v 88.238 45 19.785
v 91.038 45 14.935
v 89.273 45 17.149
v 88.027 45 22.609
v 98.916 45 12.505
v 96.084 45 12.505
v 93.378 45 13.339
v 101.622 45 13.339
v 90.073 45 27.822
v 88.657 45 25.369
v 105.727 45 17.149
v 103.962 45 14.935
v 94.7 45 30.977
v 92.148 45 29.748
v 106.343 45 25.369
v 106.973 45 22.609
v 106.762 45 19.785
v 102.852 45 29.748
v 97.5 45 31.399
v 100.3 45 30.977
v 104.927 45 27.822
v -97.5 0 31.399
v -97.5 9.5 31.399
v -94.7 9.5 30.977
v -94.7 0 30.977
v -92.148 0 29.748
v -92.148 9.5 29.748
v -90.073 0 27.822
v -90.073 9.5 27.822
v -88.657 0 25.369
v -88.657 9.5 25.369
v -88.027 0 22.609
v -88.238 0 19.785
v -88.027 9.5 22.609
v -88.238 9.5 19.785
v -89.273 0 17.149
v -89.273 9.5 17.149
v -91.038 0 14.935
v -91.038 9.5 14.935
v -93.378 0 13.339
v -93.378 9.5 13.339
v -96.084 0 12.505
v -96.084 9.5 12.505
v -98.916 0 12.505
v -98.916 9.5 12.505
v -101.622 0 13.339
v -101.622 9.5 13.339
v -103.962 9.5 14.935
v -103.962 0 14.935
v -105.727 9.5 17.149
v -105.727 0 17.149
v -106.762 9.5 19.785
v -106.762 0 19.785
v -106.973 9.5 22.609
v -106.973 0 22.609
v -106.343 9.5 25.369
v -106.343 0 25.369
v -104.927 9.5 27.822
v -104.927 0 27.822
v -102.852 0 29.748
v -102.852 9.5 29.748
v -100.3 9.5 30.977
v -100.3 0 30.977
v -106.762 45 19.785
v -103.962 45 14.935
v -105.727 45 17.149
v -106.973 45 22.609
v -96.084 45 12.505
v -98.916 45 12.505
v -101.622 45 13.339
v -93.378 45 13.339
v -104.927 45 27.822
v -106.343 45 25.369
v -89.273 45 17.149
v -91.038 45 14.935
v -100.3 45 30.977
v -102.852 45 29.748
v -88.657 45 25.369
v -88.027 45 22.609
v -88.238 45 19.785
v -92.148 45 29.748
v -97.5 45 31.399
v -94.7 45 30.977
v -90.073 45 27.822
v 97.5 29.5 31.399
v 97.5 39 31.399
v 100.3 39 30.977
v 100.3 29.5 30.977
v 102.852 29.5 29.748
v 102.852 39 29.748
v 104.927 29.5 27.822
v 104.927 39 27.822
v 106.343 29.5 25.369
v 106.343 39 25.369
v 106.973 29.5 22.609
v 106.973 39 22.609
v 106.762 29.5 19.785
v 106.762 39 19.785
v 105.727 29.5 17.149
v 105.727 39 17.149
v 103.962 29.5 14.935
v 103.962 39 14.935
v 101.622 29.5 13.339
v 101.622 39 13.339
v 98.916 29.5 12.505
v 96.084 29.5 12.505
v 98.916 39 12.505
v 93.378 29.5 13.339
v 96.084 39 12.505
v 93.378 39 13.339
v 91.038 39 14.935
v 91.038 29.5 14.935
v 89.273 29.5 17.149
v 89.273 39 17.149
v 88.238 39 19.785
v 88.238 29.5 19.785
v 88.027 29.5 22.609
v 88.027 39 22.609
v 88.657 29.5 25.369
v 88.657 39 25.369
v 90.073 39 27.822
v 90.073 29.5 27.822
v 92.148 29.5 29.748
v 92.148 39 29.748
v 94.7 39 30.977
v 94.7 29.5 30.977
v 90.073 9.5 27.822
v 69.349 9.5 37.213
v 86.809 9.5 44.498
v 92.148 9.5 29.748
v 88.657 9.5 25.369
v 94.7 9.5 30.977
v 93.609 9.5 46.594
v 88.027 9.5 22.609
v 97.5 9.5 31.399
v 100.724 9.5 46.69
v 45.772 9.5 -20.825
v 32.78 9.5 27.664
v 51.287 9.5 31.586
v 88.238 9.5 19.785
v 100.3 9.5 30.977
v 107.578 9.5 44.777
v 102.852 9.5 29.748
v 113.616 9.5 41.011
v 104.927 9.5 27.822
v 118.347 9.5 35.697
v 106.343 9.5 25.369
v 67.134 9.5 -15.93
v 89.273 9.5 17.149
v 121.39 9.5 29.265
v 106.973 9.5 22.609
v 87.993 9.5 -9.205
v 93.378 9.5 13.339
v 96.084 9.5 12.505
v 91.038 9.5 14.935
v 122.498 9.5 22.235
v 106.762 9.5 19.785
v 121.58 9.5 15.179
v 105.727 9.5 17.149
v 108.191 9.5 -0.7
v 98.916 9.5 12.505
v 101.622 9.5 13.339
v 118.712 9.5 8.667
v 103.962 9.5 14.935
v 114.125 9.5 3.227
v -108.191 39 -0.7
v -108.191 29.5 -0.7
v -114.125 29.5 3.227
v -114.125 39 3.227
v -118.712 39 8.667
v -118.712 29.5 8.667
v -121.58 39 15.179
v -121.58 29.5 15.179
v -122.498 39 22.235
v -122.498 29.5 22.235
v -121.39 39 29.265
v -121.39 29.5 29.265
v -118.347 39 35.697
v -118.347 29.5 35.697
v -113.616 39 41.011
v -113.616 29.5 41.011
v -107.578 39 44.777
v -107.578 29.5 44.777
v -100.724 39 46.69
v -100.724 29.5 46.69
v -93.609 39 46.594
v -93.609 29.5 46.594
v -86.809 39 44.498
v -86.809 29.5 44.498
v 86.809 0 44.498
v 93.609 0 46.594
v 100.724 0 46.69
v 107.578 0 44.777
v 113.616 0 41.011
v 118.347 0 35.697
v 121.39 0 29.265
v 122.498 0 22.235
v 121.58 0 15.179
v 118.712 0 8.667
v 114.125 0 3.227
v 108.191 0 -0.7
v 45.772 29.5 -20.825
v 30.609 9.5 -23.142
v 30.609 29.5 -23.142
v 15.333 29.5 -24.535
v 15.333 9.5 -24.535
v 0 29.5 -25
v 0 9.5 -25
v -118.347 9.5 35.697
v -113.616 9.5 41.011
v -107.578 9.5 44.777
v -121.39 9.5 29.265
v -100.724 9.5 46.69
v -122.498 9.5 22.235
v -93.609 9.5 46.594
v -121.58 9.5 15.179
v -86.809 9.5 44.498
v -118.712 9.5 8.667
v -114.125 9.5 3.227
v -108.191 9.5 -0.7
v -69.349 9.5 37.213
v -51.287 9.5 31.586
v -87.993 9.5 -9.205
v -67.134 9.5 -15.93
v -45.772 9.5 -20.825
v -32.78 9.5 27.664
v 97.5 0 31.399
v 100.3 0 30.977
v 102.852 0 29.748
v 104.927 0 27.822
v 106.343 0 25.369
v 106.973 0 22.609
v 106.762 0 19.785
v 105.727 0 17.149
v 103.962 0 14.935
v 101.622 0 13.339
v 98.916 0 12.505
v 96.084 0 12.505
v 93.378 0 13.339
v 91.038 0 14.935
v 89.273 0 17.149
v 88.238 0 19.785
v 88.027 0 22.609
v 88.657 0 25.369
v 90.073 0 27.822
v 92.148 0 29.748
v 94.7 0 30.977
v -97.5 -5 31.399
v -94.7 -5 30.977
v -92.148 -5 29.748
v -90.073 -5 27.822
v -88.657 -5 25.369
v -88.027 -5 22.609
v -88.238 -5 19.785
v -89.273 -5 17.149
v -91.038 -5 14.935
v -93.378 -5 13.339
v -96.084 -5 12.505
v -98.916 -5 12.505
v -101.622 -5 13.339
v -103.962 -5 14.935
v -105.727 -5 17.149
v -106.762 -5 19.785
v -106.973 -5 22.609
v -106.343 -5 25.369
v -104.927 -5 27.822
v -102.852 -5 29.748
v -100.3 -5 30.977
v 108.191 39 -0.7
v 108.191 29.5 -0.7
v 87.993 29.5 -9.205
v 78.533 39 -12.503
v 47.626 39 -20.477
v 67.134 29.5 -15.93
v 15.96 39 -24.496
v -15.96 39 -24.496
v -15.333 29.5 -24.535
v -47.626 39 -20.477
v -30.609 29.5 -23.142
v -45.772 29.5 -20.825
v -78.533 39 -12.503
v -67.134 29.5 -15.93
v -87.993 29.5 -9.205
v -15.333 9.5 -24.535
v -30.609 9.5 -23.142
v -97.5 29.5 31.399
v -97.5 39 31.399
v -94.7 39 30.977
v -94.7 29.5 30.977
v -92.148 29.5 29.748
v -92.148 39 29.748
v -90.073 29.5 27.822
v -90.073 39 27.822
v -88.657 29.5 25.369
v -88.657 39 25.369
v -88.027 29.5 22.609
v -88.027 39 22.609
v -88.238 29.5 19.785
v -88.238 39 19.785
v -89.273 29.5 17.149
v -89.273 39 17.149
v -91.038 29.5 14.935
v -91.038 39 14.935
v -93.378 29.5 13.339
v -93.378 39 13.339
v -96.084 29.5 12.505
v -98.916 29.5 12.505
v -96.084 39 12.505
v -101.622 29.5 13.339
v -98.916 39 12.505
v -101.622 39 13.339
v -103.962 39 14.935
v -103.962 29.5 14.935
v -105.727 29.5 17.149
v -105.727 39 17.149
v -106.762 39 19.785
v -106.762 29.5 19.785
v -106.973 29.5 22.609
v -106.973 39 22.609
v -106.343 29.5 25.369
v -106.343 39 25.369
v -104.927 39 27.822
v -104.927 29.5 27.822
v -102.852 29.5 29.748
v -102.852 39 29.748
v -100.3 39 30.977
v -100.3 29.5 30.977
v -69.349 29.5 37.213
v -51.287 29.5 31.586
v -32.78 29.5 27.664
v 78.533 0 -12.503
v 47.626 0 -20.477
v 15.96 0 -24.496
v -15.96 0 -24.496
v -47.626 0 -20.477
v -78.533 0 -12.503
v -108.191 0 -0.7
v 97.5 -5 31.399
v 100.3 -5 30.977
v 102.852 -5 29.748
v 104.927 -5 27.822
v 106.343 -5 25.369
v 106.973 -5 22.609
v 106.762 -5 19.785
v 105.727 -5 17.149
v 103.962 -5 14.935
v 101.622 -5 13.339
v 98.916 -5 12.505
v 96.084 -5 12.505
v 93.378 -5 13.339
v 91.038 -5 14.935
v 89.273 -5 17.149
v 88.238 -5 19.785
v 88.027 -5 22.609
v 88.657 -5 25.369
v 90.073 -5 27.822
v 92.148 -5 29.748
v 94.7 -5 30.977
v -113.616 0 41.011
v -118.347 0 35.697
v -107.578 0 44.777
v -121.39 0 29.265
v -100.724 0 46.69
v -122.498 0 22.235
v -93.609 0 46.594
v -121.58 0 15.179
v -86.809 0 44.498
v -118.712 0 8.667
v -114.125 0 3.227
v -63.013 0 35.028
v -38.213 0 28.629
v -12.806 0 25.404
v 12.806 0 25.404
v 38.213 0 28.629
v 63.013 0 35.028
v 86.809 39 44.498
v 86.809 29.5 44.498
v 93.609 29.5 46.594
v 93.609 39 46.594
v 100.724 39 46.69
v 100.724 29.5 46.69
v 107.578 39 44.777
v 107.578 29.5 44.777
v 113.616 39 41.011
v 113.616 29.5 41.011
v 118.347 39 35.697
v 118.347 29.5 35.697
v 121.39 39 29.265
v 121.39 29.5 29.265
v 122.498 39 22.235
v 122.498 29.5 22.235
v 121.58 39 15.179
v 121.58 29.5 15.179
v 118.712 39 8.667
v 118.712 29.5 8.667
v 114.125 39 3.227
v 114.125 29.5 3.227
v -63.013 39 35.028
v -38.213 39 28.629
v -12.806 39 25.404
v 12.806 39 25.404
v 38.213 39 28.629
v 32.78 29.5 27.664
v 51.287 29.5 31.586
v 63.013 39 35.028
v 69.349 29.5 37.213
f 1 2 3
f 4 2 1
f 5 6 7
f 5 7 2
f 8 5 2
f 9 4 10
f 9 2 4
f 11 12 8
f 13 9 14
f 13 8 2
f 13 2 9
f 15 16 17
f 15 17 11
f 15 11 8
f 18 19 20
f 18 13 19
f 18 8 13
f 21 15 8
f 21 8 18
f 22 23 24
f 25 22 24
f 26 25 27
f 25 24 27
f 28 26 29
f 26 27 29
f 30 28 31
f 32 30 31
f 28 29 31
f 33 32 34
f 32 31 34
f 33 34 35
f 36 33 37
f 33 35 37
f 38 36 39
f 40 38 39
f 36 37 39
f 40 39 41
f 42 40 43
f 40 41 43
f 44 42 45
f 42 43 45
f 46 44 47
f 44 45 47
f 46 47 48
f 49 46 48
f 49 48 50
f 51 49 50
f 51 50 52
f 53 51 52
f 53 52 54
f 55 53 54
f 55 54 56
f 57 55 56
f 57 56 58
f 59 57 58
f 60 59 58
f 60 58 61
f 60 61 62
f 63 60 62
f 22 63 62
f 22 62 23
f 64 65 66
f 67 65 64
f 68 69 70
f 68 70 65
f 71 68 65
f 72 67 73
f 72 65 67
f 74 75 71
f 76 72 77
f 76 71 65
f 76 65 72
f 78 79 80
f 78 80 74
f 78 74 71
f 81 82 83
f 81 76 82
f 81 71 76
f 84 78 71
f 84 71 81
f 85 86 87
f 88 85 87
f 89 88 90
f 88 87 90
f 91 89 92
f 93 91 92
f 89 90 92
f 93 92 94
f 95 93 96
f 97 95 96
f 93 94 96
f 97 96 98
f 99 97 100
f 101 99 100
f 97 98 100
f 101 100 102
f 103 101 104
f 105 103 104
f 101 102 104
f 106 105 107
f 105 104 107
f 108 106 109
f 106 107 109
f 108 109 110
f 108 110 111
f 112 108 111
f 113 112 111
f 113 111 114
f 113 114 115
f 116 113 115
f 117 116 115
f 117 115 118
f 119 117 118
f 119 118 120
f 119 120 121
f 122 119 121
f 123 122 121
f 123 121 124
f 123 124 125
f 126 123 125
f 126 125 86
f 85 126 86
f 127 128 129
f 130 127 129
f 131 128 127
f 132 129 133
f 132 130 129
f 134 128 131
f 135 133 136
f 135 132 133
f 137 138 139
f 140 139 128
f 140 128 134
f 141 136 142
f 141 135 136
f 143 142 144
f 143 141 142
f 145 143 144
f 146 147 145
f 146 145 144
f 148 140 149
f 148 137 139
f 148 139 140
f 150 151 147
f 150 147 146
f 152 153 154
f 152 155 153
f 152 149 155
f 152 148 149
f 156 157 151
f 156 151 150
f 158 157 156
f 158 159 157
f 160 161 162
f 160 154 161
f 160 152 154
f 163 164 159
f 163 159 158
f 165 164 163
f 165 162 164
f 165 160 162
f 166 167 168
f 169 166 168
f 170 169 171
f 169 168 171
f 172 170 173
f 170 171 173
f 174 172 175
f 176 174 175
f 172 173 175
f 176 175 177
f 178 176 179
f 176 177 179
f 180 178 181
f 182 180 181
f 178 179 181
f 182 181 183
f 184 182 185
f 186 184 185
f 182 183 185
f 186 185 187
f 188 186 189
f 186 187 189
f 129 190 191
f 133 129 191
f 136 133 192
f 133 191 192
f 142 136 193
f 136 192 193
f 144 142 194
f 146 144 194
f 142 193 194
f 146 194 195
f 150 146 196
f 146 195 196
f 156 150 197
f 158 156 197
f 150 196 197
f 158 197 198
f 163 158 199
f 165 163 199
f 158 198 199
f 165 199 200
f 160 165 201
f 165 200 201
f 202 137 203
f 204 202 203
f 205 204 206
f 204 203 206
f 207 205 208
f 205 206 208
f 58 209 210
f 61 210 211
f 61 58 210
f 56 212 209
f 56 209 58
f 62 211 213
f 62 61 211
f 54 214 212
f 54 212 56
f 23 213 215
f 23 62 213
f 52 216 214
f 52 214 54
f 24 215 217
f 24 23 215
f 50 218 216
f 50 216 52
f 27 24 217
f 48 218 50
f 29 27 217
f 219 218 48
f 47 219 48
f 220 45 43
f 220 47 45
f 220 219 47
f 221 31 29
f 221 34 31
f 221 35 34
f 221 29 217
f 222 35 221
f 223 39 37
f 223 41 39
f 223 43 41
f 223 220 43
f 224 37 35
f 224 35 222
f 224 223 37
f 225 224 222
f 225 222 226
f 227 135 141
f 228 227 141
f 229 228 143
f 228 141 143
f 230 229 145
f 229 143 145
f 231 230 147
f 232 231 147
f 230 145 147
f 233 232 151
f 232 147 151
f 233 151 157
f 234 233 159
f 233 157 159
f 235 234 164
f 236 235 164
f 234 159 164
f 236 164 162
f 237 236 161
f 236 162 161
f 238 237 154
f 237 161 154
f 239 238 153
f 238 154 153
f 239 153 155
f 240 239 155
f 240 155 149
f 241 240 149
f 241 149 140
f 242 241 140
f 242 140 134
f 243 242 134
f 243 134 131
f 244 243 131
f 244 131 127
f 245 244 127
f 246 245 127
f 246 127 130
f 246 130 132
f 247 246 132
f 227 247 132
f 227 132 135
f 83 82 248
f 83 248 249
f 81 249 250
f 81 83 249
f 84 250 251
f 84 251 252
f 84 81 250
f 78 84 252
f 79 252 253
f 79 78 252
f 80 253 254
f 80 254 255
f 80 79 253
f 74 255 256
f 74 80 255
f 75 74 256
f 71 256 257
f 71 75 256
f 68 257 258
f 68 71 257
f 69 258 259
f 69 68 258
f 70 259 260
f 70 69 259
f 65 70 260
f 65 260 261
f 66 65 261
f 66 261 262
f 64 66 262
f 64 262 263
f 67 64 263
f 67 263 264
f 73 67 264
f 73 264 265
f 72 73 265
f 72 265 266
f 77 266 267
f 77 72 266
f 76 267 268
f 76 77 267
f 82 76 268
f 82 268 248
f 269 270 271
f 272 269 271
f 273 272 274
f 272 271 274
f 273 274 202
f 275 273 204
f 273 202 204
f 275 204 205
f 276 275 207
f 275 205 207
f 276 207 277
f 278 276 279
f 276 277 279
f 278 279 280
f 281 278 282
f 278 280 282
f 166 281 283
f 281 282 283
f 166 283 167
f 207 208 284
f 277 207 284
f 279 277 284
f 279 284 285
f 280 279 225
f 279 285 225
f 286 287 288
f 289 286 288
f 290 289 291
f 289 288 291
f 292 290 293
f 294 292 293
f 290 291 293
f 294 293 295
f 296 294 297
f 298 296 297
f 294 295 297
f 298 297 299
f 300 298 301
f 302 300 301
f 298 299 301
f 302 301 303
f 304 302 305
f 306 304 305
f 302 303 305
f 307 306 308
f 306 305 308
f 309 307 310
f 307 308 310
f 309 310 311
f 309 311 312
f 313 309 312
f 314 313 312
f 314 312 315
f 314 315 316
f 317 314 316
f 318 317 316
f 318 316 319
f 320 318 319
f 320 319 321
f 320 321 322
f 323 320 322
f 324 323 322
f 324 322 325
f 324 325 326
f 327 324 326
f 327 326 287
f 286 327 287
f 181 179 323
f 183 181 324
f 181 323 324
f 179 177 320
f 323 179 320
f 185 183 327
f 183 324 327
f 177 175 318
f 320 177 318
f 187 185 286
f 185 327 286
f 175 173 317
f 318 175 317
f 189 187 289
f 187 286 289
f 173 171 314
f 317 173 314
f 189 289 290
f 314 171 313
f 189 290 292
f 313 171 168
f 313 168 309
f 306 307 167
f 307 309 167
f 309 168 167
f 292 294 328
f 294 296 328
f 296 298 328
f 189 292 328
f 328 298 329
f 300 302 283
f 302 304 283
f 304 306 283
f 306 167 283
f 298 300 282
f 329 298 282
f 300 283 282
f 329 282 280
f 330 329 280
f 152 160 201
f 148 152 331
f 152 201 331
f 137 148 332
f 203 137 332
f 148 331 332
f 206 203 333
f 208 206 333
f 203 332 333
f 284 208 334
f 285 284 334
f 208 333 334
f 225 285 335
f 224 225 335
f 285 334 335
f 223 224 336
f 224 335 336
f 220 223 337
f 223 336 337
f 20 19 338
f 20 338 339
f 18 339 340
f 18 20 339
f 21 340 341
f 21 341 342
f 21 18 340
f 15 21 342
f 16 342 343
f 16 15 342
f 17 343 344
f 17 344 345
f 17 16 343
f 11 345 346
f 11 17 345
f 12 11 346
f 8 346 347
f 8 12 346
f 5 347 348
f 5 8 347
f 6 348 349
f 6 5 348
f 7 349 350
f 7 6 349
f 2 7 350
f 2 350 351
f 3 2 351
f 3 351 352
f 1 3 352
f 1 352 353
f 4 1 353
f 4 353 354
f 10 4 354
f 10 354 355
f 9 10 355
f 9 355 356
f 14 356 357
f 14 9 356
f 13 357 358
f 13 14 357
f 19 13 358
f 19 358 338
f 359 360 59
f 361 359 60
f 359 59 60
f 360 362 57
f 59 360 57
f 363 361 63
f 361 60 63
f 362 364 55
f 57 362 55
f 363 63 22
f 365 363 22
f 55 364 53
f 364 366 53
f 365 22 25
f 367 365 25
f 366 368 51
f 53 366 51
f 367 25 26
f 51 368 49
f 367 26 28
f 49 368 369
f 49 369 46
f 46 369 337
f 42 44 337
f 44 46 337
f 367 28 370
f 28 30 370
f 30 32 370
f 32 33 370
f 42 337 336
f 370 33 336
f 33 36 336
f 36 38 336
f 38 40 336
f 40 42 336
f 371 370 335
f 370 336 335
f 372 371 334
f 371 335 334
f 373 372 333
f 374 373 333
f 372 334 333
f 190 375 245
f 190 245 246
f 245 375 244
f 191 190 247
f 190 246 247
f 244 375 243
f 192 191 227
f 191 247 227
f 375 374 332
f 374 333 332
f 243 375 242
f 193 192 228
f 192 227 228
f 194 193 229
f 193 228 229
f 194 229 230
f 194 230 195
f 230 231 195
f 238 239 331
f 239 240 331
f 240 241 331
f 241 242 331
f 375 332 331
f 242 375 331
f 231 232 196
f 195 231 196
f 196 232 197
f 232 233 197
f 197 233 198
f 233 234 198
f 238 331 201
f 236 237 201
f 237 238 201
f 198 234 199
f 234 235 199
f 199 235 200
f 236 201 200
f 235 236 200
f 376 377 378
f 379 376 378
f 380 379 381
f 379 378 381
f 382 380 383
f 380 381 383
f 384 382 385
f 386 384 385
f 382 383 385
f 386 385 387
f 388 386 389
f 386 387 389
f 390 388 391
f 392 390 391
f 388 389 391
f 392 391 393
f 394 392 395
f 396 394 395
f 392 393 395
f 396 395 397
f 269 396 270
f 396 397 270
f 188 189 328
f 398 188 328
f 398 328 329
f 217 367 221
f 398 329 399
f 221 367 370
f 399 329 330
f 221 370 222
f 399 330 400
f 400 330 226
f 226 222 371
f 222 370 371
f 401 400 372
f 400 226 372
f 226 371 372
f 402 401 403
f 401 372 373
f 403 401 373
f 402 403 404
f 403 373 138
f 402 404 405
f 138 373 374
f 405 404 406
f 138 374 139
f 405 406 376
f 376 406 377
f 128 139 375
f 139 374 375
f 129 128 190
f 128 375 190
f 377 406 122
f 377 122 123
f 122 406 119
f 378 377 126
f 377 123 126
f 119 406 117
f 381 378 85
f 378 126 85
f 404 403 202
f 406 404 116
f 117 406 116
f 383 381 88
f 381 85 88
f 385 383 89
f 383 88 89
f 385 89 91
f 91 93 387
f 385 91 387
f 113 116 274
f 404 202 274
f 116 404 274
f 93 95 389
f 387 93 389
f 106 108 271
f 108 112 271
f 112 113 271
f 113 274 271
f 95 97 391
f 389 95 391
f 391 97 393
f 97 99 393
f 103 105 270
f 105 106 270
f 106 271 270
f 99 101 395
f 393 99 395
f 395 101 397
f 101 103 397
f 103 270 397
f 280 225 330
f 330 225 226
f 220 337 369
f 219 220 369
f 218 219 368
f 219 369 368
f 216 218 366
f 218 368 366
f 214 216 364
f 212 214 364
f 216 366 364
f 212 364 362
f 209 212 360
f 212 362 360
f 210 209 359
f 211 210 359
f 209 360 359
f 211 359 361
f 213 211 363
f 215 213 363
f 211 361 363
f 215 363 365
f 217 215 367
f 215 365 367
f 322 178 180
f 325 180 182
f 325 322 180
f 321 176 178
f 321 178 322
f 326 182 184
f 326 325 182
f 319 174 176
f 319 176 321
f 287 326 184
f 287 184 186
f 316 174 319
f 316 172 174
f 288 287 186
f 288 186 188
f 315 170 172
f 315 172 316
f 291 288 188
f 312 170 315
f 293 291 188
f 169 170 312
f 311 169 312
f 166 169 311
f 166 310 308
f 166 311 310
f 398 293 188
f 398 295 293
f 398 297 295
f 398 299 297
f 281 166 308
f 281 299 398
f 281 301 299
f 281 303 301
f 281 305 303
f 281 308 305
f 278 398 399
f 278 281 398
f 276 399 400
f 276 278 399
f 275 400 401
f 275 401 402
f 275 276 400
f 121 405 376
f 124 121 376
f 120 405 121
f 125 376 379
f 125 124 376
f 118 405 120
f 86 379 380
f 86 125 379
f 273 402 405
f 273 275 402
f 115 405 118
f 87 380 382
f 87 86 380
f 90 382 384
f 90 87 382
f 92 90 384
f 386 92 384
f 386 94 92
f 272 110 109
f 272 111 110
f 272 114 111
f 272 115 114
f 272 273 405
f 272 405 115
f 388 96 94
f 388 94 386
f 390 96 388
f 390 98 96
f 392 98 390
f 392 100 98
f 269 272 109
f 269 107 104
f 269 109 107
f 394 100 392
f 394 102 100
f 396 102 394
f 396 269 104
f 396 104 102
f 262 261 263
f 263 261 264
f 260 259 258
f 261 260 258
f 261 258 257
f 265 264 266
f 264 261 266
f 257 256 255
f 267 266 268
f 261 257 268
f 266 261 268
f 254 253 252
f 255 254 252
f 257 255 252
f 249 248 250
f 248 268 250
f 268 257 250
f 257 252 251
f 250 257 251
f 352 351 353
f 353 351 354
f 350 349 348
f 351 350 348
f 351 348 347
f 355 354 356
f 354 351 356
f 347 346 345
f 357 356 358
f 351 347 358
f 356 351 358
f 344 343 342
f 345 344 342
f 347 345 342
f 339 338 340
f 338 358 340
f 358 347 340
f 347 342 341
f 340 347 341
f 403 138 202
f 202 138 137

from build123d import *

# Parameters (mm, degrees)
BOSS_EXTRUDE1_DEPTH   = 9.5
BOSS_EXTRUDE2_DEPTH   = 20
BOSS_EXTRUDE3_DEPTH   = 9.5
SKETCH4_R             = 9.5
CUT_EXTRUDE1_DEPTH    = 137.845668985
BOSS_EXTRUDE4_START   = 6
SKETCH4_2_R           = 9.5
BOSS_EXTRUDE4_DEPTH   = 50
BOSS_EXTRUDE4_2_DEPTH = 50


with BuildPart() as part:
    # Sketch1 → Boss-Extrude1 (new body)
    with BuildSketch(Plane(origin=(0, 0, 0), x_dir=(1, 0, 0), z_dir=(0, 1, 0))):
        with BuildLine():
            ThreePointArc((108.190789474, 0.700137895), (0, 25), (-108.190789474, 0.700137895))
            ThreePointArc((-108.190789474, 0.700137895), (-120.098827855, -32.589479434), (-86.809210526, -44.497517816))
            ThreePointArc((-86.809210526, -44.497517816), (0, -25), (86.809210526, -44.497517816))
            ThreePointArc((86.809210526, -44.497517816), (120.098827855, -32.589479434), (108.190789474, 0.700137895))
        make_face()
    extrude(amount=BOSS_EXTRUDE1_DEPTH)

    # Sketch2 → Boss-Extrude2 (add)
    with BuildSketch(Plane(origin=(0, 9.5, 0), x_dir=(1, 0, 0), z_dir=(0, 1, 0))):
        with BuildLine():
            ThreePointArc((45.772423296, 20.825009325), (0, 25), (-45.772423296, 20.825009325))
            Line((-45.772423296, 20.825009325), (-32.779812988, -27.664072467))
            ThreePointArc((-32.779812988, -27.664072467), (0, -25), (32.779812988, -27.664072467))
            Line((32.779812988, -27.664072467), (45.772423296, 20.825009325))
        make_face()
    extrude(amount=BOSS_EXTRUDE2_DEPTH)

    # Sketch3 → Boss-Extrude3 (add)
    with BuildSketch(Plane(origin=(0, 29.5, 0), x_dir=(1, 0, 0), z_dir=(0, 1, 0))):
        with BuildLine():
            ThreePointArc((108.190789474, 0.700137895), (0, 25), (-108.190789474, 0.700137895))
            ThreePointArc((-108.190789474, 0.700137895), (-120.098827855, -32.589479434), (-86.809210526, -44.497517816))
            ThreePointArc((-86.809210526, -44.497517816), (0, -25), (86.809210526, -44.497517816))
            ThreePointArc((86.809210526, -44.497517816), (120.098827855, -32.589479434), (108.190789474, 0.700137895))
        make_face()
    extrude(amount=BOSS_EXTRUDE3_DEPTH)

    # Sketch4 → Cut-Extrude1 (cut, through all)
    with BuildSketch(Plane(origin=(0, 39, 0), x_dir=(1, 0, 0), z_dir=(0, 1, 0))):
        with Locations((-97.5, -21.89868996)):
            Circle(SKETCH4_R)
        with Locations((97.5, -21.89868996)):
            Circle(SKETCH4_R)
    extrude(amount=-CUT_EXTRUDE1_DEPTH, mode=Mode.SUBTRACT)


with BuildPart() as body_2:
    # Sketch4<2> → Boss-Extrude4 (new body)
    with BuildSketch(Plane(origin=(0, 39, 0), x_dir=(1, 0, 0), z_dir=(0, 1, 0)).offset(BOSS_EXTRUDE4_START)):
        with Locations((-97.5, -21.89868996)):
            Circle(SKETCH4_2_R)
    extrude(amount=-BOSS_EXTRUDE4_DEPTH)


with BuildPart() as body_3:
    # Sketch4<2> → Boss-Extrude4 2 (new body)
    with BuildSketch(Plane(origin=(0, 39, 0), x_dir=(1, 0, 0), z_dir=(0, 1, 0)).offset(BOSS_EXTRUDE4_START)):
        with Locations((97.5, -21.89868996)):
            Circle(SKETCH4_2_R)
    extrude(amount=-BOSS_EXTRUDE4_2_DEPTH)


solid = Compound([part.part, body_2.part, body_3.part])
